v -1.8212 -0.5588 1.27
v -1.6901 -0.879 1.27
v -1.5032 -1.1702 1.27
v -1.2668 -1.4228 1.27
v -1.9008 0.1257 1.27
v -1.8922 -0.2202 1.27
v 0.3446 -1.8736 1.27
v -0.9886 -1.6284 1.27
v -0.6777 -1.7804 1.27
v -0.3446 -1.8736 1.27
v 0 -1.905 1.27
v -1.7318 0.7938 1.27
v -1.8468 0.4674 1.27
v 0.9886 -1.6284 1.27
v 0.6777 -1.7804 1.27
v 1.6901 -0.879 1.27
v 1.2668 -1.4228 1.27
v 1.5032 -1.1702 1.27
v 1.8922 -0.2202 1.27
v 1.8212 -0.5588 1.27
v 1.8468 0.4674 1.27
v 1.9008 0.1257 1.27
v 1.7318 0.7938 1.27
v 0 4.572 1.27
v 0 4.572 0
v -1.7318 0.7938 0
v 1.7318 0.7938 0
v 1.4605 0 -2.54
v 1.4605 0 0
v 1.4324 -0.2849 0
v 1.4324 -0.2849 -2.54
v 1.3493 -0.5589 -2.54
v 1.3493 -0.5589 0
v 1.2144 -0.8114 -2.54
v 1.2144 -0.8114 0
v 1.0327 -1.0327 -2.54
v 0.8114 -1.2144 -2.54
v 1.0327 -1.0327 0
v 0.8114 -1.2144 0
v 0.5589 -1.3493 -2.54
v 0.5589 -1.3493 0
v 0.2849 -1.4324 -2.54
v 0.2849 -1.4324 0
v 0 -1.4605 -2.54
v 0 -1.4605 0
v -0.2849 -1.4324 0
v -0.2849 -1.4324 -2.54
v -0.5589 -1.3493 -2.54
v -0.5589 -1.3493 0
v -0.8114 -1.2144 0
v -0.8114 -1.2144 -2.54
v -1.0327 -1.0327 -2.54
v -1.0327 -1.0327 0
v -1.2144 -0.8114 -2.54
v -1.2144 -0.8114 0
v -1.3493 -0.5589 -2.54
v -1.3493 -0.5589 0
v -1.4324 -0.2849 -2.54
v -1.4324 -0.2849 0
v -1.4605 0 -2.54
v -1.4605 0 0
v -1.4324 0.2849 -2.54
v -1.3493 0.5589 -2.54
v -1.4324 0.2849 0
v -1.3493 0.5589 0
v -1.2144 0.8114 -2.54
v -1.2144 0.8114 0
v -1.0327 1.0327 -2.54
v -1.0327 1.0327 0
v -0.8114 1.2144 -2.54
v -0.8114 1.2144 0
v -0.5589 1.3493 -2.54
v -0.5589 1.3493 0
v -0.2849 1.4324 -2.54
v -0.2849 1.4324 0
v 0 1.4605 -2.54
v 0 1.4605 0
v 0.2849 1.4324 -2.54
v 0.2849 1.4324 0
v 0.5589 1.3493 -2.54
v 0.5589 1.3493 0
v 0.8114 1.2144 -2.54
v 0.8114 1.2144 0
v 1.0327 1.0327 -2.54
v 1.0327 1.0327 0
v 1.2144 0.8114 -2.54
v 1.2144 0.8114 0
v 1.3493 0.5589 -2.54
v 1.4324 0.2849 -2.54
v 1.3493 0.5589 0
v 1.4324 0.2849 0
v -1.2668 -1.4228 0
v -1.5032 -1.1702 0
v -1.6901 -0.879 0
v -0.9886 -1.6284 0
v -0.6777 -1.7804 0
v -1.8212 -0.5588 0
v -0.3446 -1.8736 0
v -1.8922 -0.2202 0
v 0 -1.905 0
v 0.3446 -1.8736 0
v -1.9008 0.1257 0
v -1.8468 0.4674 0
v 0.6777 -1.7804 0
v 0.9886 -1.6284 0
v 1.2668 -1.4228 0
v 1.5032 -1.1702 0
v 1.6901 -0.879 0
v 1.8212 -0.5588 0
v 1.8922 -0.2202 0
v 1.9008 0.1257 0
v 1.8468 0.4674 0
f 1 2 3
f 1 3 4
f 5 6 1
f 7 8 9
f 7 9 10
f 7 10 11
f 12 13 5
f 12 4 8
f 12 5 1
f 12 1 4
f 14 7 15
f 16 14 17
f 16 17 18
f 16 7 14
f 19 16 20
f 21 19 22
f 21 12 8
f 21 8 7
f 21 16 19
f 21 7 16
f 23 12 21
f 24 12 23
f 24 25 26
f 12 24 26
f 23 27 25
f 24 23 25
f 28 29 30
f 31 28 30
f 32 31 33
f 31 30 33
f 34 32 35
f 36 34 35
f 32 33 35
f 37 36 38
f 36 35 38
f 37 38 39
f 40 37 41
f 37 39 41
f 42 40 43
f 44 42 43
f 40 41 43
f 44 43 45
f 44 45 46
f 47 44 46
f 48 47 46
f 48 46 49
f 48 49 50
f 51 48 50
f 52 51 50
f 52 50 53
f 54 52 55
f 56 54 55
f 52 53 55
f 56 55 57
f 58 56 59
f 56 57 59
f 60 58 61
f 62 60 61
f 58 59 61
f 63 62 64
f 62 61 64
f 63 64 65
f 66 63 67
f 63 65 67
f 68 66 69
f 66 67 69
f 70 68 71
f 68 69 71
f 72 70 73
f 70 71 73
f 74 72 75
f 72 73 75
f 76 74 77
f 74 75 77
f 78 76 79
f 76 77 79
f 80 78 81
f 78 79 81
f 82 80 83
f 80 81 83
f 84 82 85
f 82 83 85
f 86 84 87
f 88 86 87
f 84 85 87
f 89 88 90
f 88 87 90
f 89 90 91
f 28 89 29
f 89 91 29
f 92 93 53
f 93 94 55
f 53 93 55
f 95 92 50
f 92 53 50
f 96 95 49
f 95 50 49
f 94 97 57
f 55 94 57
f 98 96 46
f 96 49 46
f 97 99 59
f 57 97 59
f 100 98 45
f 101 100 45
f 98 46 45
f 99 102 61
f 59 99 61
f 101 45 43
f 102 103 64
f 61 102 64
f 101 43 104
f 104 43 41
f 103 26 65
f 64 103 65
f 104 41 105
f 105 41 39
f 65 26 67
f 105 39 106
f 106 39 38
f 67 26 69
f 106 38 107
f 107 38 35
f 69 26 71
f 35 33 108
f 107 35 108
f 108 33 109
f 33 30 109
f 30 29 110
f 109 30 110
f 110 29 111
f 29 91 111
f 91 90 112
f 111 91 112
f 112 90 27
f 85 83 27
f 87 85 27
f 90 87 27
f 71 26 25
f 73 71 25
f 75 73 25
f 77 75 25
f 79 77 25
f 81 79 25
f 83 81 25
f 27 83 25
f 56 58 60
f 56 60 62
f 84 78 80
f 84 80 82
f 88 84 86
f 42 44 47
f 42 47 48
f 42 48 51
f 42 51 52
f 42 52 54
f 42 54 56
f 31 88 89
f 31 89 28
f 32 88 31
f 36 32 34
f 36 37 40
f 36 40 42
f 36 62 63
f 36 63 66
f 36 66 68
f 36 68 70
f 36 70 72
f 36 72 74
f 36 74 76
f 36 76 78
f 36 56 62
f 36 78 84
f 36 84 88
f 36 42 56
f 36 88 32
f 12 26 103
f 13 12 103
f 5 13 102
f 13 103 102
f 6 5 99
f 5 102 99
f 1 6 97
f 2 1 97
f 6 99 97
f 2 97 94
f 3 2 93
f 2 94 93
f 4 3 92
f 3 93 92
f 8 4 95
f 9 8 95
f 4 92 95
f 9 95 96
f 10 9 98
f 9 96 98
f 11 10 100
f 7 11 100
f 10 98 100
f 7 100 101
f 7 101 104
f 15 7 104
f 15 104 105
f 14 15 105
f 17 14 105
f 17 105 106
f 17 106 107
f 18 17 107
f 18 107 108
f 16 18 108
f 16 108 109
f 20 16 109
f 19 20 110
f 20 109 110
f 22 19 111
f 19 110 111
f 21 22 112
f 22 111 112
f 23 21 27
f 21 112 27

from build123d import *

# Parameters (mm, degrees)
F1_DEPTH = 1.27
F2_R     = 1.4605
F3_DEPTH = 2.54


with BuildPart() as f1:
    # F0 (on Top) → F1 (new body)
    with BuildSketch(Plane.XY):
        with BuildLine():
            Line((0, 4.572), (-1.731758, 0.79375))
            ThreePointArc((-1.731758, 0.79375), (0, -1.905), (1.731758, 0.79375))
            Line((1.731758, 0.79375), (0, 4.572))
        make_face()
    extrude(amount=F1_DEPTH)

    # F2 (on face) → F3 (join)
    with BuildSketch(Plane(origin=(0, 0, 0), x_dir=(1, 0, 0), z_dir=(0, 0, -1))):
        Circle(F2_R)
    extrude(amount=F3_DEPTH)


solid = f1.part
